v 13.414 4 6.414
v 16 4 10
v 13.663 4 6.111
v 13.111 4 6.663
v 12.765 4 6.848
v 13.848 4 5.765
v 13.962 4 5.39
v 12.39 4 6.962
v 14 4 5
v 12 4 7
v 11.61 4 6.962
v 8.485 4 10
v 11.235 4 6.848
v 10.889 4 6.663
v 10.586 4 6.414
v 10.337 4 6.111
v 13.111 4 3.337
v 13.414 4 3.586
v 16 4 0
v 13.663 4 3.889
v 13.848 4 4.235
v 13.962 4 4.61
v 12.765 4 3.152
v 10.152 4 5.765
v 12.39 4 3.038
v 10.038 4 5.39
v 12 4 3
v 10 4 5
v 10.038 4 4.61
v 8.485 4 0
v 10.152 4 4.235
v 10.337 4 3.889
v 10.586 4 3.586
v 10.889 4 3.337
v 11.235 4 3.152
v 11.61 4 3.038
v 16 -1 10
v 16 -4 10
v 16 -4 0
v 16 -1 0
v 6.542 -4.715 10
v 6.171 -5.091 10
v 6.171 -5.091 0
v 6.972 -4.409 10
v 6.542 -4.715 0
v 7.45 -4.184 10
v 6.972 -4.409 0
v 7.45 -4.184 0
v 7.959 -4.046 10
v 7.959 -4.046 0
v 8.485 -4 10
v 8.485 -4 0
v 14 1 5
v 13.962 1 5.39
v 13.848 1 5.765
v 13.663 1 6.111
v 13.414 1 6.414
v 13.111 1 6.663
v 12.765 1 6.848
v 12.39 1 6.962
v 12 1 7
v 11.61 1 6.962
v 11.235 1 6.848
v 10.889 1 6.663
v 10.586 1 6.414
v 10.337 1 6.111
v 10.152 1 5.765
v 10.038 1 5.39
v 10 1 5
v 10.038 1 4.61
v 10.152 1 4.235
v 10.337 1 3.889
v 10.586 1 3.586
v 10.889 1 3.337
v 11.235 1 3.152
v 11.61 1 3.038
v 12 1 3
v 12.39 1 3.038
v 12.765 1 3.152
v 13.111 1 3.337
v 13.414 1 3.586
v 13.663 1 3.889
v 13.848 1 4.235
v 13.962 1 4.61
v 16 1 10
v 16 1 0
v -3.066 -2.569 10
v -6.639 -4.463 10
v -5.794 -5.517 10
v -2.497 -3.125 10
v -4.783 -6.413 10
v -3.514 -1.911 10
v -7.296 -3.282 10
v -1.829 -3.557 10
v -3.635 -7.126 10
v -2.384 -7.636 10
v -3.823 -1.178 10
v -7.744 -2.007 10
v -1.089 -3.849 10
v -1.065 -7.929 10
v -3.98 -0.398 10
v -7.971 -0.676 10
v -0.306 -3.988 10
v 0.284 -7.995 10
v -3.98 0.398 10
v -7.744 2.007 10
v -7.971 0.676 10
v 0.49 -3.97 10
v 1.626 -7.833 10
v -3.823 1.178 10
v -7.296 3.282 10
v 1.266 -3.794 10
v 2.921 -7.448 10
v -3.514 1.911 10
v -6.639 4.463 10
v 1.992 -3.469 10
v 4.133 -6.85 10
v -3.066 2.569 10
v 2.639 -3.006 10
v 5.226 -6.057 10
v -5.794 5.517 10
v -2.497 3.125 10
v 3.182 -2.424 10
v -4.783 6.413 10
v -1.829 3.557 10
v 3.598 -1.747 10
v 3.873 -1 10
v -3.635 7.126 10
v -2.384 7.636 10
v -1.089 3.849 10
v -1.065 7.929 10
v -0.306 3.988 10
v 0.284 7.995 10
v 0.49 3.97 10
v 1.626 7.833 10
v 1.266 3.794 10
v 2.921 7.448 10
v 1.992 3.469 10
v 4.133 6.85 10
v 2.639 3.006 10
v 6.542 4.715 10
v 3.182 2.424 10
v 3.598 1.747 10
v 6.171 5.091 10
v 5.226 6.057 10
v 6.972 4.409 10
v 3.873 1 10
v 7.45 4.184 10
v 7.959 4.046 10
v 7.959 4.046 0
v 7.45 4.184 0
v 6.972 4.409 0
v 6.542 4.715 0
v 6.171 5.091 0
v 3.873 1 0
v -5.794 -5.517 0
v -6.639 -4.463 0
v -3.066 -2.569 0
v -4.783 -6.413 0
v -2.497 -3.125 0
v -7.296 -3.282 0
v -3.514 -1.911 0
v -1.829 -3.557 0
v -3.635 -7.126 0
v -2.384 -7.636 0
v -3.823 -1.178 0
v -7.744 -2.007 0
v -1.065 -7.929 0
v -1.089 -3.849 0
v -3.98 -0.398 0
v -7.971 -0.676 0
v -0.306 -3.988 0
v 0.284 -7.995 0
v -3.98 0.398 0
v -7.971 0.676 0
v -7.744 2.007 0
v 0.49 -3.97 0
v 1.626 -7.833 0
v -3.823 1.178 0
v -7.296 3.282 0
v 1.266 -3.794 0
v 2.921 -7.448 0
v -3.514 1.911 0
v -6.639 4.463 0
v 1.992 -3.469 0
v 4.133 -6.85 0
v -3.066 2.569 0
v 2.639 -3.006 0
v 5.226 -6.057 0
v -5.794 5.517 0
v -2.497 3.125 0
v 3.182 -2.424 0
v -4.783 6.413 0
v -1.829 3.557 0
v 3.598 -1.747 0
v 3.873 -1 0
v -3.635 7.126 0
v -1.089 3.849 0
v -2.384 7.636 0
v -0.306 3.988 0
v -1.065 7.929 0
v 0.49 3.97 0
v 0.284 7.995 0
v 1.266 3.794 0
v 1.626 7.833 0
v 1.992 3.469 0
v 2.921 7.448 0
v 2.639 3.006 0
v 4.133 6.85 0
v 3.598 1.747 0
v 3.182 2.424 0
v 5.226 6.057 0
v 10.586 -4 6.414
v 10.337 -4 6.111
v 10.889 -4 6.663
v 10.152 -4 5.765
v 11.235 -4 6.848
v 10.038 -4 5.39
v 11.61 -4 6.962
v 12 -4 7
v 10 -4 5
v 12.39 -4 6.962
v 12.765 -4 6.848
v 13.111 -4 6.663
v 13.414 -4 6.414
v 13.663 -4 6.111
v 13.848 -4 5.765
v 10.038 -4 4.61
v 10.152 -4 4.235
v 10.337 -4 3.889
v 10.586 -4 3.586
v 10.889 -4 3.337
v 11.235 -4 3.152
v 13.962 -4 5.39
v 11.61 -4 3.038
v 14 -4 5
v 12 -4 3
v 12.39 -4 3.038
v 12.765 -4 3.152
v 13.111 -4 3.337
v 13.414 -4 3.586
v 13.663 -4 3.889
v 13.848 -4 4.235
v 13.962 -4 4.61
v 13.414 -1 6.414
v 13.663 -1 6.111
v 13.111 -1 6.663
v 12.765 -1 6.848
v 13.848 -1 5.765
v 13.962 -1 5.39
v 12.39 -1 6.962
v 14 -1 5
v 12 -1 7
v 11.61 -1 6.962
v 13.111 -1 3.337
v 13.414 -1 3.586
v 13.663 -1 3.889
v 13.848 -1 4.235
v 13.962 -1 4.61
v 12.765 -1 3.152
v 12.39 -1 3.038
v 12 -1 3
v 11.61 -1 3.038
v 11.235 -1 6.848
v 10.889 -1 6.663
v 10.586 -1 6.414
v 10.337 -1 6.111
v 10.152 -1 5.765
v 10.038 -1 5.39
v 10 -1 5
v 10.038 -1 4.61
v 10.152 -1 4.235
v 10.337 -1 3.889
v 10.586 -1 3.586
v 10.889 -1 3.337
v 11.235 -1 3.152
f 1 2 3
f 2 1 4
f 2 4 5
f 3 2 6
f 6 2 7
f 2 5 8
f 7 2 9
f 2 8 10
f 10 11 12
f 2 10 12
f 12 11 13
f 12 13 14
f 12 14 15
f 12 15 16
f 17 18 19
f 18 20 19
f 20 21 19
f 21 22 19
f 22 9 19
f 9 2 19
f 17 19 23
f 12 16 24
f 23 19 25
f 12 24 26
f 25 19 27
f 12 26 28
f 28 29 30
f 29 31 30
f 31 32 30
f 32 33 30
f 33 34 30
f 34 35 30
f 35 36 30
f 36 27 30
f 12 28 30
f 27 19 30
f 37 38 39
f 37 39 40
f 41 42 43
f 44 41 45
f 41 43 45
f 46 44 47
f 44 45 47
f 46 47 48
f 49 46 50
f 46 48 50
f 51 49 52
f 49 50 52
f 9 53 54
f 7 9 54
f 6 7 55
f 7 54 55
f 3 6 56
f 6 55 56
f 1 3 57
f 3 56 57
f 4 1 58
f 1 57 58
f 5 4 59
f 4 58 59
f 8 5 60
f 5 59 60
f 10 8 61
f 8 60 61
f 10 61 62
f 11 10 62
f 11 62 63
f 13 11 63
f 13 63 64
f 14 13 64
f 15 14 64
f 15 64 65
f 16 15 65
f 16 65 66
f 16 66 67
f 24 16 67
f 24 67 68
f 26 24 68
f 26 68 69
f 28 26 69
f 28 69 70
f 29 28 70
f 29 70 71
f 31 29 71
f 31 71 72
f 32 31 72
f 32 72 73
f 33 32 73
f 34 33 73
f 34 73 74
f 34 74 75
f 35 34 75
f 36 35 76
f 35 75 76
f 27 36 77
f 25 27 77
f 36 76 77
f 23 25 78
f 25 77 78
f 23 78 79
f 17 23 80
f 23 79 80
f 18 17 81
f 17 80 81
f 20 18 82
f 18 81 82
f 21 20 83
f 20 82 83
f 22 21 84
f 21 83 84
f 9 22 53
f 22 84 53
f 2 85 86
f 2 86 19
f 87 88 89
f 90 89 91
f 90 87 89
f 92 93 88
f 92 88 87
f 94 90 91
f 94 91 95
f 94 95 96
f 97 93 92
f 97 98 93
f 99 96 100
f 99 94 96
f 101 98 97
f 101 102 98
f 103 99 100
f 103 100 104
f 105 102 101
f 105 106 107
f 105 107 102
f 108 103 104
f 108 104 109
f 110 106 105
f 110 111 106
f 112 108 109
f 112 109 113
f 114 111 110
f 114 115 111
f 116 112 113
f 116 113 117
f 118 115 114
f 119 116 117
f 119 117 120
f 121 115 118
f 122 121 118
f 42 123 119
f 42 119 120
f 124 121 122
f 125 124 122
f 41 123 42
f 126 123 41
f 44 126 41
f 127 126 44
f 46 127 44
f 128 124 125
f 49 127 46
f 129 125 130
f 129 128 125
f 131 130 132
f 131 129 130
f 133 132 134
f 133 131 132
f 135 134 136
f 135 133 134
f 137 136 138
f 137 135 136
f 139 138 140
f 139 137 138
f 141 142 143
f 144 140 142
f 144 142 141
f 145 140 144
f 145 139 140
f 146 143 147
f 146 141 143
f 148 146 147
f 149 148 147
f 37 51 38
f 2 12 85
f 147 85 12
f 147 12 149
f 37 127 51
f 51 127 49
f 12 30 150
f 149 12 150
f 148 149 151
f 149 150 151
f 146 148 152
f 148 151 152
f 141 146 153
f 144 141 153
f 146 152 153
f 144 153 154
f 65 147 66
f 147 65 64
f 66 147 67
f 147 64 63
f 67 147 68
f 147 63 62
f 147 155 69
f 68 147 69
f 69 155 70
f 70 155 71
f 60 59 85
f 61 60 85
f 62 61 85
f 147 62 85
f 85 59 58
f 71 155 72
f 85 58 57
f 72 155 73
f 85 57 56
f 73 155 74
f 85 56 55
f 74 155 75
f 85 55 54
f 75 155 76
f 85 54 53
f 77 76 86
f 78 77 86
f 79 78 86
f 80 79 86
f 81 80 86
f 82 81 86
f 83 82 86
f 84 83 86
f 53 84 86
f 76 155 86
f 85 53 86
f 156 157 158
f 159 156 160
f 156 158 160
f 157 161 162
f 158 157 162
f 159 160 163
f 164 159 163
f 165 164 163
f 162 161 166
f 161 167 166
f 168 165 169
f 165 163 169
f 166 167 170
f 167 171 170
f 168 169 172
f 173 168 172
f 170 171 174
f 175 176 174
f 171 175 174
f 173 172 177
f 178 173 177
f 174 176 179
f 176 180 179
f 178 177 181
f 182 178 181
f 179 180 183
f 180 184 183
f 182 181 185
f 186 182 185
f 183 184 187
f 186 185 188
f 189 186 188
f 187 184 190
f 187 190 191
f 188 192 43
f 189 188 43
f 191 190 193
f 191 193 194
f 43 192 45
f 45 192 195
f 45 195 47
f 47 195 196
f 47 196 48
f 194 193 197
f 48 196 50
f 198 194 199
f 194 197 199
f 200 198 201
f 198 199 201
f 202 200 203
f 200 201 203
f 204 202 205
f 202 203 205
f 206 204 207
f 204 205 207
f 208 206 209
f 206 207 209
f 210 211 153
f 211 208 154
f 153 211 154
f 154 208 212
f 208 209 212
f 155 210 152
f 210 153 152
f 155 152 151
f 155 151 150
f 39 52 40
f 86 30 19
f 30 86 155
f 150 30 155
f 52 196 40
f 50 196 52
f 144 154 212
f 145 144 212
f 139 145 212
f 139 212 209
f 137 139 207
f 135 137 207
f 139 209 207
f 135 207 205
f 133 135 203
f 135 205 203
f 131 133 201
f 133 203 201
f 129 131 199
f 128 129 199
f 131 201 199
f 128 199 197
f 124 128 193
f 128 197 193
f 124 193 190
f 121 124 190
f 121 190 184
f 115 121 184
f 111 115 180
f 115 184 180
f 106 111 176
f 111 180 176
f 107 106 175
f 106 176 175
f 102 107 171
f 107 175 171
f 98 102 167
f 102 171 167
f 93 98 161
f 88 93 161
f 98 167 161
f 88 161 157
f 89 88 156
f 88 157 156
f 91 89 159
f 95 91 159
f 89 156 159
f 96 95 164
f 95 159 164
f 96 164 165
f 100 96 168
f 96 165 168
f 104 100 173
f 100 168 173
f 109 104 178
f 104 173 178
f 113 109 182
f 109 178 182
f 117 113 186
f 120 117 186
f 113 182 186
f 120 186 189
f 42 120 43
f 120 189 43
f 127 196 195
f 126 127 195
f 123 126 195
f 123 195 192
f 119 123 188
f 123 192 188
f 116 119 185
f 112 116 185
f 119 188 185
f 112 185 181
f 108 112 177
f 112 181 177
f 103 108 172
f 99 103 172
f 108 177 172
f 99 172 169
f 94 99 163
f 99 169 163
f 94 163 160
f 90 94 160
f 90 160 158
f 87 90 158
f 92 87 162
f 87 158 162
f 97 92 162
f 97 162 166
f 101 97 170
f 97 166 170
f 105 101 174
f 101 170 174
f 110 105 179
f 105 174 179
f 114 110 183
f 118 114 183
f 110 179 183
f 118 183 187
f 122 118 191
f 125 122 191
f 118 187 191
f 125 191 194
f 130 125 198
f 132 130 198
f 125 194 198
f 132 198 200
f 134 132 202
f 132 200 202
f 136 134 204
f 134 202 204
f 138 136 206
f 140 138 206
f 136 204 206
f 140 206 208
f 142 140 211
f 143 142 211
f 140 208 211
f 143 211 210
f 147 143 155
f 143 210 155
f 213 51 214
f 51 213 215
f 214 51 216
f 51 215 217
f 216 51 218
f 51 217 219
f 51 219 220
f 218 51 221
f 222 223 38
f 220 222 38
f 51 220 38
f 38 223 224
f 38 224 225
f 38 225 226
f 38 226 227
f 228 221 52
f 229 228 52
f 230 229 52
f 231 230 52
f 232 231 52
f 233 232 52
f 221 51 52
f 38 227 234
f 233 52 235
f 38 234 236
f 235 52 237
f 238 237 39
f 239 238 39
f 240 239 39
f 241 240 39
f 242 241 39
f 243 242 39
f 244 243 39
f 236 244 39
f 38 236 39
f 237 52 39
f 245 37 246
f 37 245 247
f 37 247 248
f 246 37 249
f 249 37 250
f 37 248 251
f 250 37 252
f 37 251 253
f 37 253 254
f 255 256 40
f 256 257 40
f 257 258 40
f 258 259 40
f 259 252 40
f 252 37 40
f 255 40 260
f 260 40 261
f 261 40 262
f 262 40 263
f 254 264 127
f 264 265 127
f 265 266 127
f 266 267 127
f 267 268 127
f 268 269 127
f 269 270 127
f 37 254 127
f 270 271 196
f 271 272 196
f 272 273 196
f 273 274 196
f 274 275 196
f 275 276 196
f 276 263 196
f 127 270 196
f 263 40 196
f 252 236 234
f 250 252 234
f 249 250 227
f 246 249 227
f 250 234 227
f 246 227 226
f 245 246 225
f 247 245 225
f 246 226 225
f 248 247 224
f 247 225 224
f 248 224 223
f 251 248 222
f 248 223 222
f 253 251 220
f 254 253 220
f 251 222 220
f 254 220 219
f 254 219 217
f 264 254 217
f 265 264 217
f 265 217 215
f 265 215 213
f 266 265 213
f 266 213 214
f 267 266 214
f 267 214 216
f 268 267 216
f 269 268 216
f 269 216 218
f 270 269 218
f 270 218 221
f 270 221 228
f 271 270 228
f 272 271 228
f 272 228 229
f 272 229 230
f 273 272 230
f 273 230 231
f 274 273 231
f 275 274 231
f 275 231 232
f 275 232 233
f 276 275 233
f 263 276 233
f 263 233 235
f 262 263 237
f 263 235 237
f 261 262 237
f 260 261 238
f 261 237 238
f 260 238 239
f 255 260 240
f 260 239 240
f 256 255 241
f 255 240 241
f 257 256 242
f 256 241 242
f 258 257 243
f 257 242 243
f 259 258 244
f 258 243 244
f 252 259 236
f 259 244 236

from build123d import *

# Parameters (mm, degrees)
F1_DEPTH = 10
F2_R     = 2
F3_DEPTH = 12.001


with BuildPart() as f1:
    # F0 (on Top) → F1 (new body)
    with BuildSketch(Plane.XY):
        with BuildLine():
            ThreePointArc((3.872983, -1), (-4, 0), (3.872983, 1))
            Line((3.872983, 1), (16, 1))
            Line((16, 1), (16, 4))
            Line((16, 4), (8.485281, 4))
            ThreePointArc((8.485281, 4), (7.206077, 4.286398), (6.171114, 5.090909))
            ThreePointArc((6.171114, 5.090909), (-8, 0), (6.171114, -5.090909))
            ThreePointArc((6.171114, -5.090909), (7.206077, -4.286398), (8.485281, -4))
            Line((8.485281, -4), (16, -4))
            Line((16, -4), (16, -1))
            Line((16, -1), (3.872983, -1))
        make_face()
    extrude(amount=F1_DEPTH)

    # F2 (on face) → F3 (cut, through all)
    with BuildSketch(Plane.XZ.offset(4)):
        with Locations((12, 5)):
            Circle(F2_R)
    extrude(amount=-F3_DEPTH, mode=Mode.SUBTRACT)


solid = f1.part
